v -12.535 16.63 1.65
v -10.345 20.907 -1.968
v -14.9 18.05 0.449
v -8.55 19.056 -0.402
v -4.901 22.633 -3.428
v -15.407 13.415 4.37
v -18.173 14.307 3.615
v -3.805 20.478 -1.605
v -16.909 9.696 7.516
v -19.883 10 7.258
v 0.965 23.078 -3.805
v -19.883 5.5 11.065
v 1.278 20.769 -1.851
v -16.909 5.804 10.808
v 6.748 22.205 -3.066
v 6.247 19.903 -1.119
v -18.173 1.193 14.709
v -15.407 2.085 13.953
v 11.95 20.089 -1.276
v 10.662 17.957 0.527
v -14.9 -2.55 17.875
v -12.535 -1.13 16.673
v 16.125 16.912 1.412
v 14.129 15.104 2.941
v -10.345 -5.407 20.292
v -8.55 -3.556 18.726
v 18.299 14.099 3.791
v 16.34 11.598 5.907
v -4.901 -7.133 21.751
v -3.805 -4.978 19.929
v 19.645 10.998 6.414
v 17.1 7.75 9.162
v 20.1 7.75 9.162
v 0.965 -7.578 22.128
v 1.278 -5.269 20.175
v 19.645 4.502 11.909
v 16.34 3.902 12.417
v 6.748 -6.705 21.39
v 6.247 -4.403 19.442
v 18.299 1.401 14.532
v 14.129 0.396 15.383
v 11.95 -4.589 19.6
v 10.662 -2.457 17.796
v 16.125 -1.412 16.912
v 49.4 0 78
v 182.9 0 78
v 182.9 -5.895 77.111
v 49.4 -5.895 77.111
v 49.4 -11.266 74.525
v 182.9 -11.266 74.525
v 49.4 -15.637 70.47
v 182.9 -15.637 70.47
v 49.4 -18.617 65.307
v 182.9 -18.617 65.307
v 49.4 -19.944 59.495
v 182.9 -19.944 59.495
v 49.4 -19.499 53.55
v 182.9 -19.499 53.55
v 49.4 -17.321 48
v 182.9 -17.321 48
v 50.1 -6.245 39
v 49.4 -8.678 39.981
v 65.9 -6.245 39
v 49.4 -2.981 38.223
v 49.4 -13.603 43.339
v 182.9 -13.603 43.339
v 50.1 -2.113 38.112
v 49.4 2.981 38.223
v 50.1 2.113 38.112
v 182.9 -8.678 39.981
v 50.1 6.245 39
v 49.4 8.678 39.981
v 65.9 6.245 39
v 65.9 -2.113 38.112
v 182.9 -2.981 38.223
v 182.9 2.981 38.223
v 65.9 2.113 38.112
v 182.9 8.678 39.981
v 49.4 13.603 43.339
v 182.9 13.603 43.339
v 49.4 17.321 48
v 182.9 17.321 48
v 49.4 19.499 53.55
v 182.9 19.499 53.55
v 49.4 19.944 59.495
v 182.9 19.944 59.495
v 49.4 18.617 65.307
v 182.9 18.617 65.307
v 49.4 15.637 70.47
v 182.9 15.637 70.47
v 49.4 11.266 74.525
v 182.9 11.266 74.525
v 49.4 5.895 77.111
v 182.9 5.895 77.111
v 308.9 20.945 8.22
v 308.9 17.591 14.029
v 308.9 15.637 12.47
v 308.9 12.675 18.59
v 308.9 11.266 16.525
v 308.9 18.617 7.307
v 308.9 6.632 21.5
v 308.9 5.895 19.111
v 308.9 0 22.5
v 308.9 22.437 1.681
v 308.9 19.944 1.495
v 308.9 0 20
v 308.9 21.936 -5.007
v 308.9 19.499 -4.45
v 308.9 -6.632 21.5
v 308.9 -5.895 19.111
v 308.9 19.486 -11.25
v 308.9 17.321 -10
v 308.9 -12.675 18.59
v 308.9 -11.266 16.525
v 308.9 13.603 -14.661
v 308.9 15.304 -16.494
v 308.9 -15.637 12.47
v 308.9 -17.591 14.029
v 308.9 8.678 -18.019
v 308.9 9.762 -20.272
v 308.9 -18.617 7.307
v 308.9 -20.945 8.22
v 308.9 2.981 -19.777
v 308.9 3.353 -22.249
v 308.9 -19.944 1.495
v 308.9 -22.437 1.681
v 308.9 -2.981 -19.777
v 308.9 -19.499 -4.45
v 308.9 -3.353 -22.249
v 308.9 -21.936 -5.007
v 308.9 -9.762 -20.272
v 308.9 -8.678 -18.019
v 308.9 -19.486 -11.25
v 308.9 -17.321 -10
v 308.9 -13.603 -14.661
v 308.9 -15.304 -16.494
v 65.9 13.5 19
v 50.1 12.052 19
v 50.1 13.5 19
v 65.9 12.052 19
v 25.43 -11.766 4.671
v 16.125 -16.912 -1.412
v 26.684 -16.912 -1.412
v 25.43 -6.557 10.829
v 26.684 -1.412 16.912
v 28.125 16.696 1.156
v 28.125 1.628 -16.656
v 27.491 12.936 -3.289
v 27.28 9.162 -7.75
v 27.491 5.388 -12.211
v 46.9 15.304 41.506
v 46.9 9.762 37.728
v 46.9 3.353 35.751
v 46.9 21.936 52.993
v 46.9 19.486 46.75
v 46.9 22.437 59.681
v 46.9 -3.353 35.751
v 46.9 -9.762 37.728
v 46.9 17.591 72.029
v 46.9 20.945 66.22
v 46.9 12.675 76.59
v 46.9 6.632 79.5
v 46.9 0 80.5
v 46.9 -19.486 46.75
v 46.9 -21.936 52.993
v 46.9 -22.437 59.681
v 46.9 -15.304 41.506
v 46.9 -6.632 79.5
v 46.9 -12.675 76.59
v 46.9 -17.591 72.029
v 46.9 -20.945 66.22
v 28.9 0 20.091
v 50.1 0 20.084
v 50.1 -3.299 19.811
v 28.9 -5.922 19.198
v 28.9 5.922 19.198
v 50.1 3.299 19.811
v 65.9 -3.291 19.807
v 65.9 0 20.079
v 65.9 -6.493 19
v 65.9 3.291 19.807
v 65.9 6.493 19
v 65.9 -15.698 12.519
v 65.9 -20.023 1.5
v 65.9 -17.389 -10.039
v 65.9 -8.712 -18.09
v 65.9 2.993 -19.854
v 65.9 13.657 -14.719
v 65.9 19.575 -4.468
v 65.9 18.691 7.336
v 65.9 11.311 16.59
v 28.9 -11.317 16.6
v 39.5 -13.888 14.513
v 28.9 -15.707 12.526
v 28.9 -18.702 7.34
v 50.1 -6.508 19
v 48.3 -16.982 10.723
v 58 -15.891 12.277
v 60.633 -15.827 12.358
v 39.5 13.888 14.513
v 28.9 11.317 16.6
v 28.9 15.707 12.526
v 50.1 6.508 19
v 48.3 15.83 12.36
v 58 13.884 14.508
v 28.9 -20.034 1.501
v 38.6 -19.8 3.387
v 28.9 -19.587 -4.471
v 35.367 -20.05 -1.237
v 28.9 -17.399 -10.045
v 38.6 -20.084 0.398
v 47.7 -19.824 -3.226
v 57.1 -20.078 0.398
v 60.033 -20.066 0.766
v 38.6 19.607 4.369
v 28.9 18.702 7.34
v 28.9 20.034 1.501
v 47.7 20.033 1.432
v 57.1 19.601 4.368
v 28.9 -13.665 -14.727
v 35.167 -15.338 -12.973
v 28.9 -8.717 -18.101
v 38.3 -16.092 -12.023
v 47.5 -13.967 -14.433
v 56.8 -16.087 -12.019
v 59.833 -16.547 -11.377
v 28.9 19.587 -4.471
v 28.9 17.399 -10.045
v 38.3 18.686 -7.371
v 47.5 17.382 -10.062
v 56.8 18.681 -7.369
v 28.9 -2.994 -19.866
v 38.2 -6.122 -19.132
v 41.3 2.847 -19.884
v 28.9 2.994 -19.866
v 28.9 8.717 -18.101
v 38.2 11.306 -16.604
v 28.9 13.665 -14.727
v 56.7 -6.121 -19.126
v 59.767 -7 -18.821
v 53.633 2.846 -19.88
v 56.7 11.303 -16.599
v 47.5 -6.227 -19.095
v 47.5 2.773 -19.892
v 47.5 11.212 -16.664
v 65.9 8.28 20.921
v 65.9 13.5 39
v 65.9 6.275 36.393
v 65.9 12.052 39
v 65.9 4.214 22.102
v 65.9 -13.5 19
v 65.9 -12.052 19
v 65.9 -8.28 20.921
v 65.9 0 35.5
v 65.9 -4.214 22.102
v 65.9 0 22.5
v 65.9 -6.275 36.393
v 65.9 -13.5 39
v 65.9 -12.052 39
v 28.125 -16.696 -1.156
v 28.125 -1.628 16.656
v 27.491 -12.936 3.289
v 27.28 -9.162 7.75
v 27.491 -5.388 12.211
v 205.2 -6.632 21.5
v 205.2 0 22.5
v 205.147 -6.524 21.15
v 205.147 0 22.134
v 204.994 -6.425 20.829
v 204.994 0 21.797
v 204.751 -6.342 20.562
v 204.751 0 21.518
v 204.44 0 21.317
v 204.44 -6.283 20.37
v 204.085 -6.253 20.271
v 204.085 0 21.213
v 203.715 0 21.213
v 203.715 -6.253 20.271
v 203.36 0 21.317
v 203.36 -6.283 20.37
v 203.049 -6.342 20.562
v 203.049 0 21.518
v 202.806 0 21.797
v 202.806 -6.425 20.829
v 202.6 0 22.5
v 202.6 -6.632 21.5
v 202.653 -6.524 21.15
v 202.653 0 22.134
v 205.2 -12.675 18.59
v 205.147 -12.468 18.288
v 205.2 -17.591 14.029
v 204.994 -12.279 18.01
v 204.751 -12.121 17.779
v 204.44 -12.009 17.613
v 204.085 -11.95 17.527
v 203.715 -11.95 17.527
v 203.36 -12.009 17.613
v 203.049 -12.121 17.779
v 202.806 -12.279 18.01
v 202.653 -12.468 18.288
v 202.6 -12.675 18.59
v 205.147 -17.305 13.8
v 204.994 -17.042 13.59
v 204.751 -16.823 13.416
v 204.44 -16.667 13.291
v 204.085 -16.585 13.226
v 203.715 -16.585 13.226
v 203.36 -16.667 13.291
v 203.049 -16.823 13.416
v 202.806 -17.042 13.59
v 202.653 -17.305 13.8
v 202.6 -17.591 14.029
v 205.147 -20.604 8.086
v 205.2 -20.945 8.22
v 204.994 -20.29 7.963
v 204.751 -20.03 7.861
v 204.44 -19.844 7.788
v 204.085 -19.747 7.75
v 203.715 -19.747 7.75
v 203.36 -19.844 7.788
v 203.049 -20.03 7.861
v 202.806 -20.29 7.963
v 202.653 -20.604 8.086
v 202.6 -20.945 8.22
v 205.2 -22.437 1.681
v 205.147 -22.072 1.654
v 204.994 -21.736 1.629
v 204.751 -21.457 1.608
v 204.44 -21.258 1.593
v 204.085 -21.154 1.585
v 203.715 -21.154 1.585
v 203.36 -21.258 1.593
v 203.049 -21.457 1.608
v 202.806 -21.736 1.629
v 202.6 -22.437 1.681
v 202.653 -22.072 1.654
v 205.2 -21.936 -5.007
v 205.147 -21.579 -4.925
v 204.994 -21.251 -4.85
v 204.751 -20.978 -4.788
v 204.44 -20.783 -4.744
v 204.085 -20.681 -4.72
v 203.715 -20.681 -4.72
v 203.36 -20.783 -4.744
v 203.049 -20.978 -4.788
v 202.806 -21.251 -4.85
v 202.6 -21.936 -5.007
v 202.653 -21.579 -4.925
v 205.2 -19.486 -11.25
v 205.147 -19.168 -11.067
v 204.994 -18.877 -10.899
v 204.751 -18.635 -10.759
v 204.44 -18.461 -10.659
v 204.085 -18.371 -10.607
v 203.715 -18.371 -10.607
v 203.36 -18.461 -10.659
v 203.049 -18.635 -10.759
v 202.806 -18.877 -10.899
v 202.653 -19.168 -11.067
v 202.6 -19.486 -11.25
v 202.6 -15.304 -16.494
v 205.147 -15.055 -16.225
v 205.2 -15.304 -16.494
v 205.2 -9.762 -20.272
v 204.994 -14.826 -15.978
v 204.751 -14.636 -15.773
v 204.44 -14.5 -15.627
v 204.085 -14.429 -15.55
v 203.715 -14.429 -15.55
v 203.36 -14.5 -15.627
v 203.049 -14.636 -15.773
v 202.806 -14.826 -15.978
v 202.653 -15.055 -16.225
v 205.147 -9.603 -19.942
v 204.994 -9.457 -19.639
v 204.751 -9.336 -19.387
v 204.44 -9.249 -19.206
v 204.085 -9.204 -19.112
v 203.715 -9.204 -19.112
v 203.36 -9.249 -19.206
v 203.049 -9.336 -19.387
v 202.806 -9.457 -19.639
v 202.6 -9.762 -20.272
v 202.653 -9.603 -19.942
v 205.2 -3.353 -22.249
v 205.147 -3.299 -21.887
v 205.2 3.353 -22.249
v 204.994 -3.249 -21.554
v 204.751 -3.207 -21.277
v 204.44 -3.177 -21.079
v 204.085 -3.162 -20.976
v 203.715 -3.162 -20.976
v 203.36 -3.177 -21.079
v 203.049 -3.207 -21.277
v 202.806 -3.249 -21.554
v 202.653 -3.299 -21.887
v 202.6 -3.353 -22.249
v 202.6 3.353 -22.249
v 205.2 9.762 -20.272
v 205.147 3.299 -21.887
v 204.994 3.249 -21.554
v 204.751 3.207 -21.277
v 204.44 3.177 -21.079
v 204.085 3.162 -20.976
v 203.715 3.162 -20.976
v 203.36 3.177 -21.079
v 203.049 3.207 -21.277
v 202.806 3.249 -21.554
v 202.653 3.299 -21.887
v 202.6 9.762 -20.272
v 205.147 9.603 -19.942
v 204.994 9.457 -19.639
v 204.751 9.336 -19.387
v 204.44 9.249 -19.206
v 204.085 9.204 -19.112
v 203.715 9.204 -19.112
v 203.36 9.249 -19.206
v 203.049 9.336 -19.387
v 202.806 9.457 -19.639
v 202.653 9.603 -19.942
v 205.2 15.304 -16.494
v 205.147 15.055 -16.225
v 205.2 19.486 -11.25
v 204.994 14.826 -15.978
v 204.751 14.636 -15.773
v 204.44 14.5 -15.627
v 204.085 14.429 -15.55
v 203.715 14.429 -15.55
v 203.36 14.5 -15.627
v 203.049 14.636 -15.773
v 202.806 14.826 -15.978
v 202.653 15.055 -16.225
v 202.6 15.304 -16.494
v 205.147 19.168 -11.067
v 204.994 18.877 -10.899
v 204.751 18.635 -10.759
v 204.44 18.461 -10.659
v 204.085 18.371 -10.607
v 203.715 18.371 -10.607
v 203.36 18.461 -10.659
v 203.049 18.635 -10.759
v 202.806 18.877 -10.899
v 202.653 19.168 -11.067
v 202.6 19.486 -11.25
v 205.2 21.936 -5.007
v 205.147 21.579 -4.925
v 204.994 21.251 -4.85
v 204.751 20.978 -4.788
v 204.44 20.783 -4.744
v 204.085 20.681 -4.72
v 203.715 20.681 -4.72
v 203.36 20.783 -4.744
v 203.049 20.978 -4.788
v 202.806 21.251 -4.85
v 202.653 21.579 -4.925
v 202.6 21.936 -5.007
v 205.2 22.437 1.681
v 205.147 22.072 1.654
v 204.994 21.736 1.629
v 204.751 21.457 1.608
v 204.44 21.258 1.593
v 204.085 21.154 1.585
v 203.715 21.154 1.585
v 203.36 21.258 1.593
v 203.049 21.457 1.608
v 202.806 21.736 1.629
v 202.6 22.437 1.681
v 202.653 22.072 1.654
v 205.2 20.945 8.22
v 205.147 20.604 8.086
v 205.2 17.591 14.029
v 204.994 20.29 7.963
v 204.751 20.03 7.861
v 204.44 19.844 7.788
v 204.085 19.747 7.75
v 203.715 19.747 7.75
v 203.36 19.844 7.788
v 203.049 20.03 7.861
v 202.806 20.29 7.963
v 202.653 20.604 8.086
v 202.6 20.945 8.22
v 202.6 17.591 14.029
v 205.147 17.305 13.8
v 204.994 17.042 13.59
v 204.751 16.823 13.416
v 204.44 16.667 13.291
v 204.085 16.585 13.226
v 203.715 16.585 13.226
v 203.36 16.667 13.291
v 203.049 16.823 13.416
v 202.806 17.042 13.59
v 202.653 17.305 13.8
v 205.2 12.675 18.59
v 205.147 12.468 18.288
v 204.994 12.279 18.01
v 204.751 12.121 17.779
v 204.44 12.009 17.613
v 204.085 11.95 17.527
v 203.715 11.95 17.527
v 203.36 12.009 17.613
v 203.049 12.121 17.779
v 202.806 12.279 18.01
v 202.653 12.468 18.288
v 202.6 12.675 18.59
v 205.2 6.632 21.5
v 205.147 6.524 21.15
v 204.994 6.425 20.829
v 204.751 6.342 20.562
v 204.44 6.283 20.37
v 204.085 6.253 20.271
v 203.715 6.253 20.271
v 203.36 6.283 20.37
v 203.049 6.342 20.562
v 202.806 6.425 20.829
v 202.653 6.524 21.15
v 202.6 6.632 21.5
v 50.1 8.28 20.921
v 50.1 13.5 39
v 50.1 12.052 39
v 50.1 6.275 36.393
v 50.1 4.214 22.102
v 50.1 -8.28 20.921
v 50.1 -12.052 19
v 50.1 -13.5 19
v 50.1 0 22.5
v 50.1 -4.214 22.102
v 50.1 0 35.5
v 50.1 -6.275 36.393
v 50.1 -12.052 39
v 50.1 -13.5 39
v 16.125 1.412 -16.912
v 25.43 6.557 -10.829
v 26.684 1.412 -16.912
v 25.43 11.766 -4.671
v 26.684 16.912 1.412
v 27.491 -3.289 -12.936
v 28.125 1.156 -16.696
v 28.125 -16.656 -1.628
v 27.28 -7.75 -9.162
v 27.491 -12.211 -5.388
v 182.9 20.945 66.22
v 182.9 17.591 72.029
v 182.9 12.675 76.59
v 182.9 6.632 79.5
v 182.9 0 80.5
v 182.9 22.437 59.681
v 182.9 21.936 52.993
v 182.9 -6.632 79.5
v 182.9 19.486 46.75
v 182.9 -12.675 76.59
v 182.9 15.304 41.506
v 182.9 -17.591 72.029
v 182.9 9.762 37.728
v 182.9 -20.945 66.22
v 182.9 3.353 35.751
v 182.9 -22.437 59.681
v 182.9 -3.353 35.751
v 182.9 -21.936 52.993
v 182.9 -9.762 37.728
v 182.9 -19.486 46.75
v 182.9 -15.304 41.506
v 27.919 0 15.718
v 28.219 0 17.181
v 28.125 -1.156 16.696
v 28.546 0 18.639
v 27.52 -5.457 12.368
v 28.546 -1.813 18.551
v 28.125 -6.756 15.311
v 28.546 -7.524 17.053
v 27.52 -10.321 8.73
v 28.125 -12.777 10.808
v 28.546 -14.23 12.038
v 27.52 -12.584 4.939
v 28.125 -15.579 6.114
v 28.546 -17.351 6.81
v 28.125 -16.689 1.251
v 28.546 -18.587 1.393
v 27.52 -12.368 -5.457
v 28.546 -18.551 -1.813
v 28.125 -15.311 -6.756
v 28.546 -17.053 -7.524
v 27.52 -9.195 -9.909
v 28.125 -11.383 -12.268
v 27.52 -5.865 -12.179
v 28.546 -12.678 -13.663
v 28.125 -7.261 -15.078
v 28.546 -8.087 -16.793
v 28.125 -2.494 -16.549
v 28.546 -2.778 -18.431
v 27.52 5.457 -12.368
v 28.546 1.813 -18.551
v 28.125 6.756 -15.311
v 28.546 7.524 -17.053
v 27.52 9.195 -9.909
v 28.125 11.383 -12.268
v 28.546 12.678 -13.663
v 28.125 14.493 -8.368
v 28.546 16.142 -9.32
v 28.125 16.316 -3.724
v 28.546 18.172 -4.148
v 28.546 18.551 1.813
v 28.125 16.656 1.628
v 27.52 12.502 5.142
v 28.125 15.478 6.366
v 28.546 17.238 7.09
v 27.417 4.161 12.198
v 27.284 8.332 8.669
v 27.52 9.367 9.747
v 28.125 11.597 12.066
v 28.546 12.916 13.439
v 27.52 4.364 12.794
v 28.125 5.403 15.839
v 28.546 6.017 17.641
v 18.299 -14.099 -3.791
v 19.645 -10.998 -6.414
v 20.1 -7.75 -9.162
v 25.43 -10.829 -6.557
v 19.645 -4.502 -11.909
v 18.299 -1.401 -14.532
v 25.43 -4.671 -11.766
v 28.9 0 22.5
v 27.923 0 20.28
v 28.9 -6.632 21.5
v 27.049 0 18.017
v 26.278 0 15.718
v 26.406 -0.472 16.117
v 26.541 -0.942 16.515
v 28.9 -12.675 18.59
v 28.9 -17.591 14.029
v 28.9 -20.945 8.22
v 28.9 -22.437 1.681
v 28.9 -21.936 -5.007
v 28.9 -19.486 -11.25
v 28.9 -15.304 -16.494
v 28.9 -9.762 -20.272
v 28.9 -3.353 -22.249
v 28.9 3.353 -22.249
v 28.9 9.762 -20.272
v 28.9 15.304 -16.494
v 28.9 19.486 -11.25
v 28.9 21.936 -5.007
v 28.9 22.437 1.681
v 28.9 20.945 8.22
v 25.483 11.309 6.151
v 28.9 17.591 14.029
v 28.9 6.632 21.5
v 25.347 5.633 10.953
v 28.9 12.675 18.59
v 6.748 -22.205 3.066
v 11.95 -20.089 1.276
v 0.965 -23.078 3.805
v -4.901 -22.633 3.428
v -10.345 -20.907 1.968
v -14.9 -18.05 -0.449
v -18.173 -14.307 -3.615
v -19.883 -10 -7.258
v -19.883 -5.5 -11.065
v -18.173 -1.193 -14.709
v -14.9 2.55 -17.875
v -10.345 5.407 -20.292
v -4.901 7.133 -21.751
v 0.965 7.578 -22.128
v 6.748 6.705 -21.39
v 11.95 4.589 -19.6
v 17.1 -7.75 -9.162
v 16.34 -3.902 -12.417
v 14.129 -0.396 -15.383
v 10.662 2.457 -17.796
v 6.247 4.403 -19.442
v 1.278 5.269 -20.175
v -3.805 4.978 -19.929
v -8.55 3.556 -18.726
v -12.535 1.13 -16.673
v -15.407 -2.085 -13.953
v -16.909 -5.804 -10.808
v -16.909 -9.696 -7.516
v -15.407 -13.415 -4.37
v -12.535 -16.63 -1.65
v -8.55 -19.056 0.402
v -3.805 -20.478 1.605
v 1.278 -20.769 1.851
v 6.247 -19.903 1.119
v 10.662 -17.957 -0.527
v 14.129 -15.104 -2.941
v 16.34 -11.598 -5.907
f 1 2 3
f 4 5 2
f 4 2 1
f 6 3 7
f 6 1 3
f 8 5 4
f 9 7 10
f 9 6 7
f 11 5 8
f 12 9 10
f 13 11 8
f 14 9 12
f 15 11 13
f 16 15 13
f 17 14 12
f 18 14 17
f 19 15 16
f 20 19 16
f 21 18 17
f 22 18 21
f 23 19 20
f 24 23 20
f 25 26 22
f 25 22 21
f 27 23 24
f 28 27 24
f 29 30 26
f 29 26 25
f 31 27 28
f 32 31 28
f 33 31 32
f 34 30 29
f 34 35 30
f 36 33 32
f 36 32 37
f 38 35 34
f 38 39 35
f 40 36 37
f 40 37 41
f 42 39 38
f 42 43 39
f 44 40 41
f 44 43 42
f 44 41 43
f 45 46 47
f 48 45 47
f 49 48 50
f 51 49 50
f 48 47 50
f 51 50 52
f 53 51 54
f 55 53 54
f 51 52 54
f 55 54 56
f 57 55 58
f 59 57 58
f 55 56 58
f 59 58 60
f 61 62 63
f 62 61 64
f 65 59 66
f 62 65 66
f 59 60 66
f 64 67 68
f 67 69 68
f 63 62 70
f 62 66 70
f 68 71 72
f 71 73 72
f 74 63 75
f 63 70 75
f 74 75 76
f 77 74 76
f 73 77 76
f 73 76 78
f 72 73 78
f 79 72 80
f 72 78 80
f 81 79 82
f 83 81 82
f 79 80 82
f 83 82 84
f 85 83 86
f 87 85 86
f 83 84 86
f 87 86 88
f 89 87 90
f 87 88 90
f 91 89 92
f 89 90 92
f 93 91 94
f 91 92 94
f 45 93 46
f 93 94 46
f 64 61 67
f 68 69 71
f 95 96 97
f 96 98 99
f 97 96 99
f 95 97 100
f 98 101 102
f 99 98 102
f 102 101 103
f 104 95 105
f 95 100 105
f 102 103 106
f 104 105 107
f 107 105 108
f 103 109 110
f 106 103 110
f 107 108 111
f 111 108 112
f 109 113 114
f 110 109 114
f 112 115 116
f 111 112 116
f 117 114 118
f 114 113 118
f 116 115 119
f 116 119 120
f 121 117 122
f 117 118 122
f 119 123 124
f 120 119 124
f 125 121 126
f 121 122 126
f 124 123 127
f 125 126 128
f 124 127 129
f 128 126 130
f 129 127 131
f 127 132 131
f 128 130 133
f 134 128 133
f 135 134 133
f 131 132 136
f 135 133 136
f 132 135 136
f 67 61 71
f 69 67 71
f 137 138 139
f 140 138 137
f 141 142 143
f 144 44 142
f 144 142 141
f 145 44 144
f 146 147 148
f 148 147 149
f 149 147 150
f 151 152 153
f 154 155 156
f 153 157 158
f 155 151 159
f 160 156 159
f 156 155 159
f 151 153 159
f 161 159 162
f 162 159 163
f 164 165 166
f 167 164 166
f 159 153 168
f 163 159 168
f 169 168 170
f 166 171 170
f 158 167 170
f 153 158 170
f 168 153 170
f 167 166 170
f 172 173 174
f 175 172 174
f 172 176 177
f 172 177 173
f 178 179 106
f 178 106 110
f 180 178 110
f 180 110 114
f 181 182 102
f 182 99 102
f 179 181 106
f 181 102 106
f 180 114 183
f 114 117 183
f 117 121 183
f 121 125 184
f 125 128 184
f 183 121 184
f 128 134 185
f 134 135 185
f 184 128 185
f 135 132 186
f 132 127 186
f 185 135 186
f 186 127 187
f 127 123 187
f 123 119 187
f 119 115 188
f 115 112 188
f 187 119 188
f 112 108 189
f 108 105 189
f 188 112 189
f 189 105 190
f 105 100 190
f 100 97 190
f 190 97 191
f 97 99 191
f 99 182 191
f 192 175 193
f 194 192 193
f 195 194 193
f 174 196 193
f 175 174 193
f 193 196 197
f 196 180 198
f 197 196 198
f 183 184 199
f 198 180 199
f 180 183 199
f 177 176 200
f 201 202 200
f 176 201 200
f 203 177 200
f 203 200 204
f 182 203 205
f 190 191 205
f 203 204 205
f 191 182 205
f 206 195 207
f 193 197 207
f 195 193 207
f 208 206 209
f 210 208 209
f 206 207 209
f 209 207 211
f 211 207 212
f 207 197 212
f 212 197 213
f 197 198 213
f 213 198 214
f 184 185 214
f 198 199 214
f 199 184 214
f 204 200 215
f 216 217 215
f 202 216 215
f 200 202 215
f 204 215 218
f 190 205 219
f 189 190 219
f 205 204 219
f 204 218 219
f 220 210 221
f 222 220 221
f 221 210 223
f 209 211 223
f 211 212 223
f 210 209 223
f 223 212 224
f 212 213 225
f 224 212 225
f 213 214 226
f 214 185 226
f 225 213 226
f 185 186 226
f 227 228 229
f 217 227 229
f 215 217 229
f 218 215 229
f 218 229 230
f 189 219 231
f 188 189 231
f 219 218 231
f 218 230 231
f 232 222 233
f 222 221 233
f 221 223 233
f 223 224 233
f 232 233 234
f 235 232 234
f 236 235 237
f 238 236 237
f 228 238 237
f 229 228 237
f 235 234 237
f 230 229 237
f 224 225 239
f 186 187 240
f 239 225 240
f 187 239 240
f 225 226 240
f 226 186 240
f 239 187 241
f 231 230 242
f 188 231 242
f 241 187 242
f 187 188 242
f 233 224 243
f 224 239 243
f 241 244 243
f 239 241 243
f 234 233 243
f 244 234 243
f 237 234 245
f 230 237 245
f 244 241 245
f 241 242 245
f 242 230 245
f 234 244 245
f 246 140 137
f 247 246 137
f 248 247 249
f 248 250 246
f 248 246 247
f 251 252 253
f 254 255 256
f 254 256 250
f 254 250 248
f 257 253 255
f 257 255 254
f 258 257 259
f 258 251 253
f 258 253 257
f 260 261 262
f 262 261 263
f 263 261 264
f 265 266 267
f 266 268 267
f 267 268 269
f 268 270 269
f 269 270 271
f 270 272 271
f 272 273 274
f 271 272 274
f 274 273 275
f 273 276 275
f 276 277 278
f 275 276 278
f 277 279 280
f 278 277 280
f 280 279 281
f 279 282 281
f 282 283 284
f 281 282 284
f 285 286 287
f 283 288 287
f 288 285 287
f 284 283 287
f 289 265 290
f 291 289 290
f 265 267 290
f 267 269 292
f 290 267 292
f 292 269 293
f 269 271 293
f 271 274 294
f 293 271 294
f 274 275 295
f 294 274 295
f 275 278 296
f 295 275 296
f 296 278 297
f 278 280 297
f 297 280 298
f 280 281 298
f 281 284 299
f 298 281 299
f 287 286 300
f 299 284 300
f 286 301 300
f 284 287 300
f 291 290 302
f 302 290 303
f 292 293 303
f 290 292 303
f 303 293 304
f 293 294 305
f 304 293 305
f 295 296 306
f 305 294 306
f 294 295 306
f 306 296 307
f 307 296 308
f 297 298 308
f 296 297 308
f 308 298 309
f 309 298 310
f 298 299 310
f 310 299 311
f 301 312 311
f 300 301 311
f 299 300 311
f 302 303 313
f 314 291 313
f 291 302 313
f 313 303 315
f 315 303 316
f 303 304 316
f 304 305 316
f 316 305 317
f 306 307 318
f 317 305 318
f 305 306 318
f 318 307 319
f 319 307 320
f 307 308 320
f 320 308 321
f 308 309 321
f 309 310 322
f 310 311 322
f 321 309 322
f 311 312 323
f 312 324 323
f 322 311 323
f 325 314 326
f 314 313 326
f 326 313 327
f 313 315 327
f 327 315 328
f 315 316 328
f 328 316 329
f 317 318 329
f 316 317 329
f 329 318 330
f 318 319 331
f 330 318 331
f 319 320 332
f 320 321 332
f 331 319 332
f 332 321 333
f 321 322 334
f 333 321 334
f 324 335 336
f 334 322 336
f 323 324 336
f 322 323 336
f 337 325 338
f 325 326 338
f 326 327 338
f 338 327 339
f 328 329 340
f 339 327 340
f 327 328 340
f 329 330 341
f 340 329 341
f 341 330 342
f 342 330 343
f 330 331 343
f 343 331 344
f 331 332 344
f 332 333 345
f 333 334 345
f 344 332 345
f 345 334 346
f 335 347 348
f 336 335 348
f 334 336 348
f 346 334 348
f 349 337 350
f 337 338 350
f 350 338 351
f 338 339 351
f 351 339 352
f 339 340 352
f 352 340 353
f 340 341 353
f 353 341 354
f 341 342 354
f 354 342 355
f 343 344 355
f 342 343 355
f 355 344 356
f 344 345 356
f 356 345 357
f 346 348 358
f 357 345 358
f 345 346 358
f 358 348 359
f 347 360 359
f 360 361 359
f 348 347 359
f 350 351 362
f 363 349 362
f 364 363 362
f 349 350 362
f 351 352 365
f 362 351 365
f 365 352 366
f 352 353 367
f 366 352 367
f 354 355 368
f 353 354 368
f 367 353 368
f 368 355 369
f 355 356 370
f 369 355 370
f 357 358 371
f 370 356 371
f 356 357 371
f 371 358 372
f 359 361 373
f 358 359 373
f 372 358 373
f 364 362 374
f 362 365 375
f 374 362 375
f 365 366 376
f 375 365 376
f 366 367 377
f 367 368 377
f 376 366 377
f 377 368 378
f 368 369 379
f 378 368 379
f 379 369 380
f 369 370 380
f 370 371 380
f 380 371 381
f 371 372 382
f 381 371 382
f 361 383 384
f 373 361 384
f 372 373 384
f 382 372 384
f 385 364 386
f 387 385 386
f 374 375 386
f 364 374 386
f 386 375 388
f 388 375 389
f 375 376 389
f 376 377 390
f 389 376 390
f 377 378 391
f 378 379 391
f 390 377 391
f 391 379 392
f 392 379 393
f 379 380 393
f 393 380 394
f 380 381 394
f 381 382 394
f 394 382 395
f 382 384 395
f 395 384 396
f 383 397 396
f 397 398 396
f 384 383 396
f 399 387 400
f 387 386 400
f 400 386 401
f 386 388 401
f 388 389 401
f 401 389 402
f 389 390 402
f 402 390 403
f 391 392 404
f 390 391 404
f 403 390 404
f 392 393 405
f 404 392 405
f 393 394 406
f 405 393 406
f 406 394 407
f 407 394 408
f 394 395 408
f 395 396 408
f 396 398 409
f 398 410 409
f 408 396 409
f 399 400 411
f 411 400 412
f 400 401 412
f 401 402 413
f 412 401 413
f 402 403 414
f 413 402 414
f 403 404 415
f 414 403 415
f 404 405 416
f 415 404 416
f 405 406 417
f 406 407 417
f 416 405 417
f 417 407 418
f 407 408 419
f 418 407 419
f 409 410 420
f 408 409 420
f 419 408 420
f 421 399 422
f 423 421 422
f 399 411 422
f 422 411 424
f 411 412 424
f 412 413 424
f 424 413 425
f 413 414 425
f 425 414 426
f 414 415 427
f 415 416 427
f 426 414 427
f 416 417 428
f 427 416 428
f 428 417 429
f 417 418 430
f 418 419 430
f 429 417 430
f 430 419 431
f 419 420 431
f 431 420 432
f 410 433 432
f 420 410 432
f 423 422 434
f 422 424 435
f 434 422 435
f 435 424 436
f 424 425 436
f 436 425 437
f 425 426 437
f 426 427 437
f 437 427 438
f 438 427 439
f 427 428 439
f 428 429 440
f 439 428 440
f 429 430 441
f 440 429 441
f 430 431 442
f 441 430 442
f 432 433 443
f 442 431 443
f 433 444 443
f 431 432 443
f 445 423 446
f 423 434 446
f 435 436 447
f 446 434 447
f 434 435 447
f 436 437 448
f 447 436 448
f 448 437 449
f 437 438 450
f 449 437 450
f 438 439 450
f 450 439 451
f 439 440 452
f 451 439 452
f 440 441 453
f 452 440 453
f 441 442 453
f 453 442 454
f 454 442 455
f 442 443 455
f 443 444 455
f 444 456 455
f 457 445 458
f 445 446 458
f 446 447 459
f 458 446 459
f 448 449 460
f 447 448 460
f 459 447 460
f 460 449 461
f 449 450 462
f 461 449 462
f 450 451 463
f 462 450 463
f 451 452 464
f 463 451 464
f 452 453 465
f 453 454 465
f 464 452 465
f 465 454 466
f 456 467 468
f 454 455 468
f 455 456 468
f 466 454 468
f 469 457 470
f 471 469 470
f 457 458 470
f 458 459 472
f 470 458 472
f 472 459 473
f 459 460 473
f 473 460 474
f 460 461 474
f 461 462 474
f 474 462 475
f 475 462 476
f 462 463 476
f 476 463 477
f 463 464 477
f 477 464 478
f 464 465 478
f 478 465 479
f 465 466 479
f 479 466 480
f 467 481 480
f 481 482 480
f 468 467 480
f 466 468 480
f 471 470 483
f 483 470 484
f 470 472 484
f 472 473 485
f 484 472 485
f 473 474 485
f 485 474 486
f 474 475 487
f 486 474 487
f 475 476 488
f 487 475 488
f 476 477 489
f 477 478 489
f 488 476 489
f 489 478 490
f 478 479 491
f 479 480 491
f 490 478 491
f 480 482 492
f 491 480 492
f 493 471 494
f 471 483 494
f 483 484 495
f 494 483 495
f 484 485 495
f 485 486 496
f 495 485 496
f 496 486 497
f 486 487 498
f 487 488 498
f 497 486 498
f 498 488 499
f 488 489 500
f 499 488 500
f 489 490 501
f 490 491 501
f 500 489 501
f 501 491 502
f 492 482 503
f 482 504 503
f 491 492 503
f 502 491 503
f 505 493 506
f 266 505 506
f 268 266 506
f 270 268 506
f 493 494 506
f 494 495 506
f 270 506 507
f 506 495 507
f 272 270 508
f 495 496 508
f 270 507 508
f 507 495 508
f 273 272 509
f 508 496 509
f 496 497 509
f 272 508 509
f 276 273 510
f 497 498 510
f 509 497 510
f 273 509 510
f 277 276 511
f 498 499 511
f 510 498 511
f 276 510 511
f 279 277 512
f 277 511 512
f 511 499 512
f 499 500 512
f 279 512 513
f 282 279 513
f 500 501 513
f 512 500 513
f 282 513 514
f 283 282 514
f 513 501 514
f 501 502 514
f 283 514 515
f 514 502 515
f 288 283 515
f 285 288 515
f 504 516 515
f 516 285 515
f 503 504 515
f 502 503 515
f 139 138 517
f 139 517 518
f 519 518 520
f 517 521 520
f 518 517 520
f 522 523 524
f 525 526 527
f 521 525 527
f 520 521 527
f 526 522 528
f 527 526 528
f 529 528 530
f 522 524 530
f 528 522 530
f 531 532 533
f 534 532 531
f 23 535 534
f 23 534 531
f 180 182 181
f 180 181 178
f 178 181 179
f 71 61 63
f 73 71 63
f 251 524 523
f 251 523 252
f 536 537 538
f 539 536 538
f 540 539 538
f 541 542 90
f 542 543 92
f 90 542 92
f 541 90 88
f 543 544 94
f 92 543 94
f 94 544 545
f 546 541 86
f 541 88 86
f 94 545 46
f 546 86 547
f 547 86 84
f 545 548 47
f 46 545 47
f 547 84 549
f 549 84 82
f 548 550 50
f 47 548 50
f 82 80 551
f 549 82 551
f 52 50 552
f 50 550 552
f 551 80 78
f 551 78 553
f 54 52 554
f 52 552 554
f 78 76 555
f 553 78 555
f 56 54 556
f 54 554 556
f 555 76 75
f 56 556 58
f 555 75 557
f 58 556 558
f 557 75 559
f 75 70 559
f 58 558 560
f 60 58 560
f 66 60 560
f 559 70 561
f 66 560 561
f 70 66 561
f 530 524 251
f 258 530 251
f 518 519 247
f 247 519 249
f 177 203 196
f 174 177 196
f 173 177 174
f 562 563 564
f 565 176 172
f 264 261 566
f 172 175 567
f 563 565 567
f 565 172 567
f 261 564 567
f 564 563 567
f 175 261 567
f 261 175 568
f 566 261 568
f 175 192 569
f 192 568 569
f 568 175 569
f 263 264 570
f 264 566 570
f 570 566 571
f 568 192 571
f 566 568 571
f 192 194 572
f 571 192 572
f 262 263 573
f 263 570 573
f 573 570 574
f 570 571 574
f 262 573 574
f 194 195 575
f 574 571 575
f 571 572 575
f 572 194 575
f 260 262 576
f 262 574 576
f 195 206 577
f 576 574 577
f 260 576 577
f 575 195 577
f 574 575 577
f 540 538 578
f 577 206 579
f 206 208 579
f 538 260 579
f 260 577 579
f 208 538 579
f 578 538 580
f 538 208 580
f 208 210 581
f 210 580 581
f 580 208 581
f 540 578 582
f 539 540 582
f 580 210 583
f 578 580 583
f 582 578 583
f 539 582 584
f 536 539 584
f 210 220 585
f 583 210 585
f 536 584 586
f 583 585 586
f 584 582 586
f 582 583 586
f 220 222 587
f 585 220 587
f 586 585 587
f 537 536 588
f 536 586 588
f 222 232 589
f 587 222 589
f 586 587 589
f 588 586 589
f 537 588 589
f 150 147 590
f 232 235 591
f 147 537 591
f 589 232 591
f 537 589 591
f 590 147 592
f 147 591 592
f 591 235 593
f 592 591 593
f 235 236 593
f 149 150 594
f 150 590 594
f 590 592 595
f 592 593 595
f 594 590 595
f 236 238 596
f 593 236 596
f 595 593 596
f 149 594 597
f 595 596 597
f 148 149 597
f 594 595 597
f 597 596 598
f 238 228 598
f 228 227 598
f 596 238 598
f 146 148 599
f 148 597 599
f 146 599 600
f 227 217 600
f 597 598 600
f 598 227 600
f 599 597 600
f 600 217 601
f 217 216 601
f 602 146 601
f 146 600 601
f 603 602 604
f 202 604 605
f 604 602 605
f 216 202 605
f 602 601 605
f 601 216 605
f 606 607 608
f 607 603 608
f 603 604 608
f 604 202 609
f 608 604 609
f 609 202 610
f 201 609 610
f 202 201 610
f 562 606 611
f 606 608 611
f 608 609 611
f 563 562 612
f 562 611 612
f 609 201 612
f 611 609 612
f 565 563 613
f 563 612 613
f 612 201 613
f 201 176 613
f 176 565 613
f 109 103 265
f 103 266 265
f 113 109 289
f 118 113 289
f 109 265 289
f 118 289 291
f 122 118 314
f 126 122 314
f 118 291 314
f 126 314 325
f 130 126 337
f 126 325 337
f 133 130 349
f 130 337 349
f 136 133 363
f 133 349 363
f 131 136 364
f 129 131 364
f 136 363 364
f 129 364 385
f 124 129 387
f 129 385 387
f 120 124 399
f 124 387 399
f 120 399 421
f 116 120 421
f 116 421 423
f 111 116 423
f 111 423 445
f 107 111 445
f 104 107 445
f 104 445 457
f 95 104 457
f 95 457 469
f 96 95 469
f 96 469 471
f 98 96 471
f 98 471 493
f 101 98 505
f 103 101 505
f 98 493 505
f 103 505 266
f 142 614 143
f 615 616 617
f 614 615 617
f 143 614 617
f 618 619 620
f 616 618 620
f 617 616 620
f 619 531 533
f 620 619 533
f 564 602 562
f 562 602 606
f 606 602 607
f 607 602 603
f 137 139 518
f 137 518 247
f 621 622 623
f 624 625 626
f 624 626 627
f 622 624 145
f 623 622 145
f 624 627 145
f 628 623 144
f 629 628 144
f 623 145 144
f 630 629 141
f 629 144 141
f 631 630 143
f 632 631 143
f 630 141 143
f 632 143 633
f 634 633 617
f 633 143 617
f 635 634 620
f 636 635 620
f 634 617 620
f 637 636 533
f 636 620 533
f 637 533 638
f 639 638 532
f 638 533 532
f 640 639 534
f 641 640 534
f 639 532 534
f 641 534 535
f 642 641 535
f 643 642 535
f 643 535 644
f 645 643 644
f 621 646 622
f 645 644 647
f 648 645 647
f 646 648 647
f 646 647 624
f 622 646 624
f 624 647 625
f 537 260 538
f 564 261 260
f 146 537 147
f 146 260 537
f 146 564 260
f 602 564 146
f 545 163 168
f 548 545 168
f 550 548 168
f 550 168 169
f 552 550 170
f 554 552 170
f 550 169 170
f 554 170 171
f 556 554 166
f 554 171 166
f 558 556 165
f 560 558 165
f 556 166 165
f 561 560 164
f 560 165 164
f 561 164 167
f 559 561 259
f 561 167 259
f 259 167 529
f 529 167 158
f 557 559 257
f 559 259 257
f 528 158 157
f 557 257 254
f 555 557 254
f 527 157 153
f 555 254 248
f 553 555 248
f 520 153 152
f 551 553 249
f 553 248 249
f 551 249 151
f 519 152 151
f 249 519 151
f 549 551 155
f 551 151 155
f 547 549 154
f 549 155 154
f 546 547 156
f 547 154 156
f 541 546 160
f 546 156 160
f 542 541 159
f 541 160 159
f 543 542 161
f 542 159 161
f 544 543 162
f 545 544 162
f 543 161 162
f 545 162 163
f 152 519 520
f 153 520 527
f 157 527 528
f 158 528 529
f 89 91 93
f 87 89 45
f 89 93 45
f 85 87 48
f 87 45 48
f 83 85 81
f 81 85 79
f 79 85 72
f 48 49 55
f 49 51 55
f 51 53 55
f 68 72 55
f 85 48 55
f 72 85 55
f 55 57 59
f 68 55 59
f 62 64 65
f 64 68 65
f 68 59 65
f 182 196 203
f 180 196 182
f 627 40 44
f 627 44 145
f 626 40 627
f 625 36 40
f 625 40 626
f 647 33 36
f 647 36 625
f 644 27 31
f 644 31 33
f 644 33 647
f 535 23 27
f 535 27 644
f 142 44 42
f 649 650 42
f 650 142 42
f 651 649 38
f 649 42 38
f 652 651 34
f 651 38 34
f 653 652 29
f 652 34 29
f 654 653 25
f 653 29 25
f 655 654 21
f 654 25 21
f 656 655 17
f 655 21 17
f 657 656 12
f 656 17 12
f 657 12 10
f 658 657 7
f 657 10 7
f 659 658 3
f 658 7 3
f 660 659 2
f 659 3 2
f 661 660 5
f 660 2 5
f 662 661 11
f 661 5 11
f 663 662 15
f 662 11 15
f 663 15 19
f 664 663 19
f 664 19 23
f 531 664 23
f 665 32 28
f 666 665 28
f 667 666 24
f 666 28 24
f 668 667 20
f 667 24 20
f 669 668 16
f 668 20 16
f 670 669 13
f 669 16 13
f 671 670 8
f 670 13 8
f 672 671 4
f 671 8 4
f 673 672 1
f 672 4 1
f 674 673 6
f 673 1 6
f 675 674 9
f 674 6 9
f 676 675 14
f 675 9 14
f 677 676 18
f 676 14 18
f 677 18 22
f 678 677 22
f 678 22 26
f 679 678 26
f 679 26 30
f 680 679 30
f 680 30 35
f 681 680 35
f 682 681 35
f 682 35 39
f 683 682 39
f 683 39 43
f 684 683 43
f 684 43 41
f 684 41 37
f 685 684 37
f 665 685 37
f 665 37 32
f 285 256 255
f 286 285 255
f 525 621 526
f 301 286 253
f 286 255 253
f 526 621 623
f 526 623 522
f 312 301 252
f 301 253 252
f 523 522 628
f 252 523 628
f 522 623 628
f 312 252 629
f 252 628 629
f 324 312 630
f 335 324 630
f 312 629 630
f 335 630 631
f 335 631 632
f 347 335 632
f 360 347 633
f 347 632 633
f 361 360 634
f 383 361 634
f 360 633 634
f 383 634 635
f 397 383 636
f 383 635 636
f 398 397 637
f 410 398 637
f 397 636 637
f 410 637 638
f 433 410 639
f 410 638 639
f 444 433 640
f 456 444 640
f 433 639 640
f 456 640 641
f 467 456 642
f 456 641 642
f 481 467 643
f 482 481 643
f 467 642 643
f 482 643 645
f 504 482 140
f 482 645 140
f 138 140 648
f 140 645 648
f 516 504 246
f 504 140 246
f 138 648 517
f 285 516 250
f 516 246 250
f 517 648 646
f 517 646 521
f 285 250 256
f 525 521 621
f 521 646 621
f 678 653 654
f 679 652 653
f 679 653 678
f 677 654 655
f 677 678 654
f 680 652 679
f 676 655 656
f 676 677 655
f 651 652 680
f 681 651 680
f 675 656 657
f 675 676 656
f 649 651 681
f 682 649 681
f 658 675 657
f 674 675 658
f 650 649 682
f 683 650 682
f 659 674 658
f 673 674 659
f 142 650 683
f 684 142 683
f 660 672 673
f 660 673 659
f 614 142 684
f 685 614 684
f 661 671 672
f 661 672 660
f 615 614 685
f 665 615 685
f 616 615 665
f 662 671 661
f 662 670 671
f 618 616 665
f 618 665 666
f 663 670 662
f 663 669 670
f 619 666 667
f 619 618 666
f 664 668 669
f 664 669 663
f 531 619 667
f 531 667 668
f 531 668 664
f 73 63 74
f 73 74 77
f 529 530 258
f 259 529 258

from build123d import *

# Parameters (mm, degrees)
F4_W      = 15.8
F4_H      = 20
F5_DEPTH  = 13.5
F7_DEPTH  = 20.1
F8_R      = 17.1
F9_DEPTH  = 25
F11_DEPTH = 24


with BuildPart() as f1:
    # F0 (on Front) → F1 (revolve)
    with BuildSketch(Plane.XZ):
        with BuildLine():
            Line((28.9, 20.0906451762), (308.9, 20))
            Line((308.9, 20), (308.9, 22.5))
            Line((308.9, 22.5), (205.2, 22.5))
            ThreePointArc((205.2, 22.5), (203.9, 21.2), (202.6, 22.5))
            Line((202.6, 22.5), (28.9, 22.5))
            Line((28.9, 22.5), (28.9, 20.0906451762))
        make_face()
        with BuildLine():
            ThreePointArc((26.400000374, 0), (27.0246011146, 10.1231447503), (28.9, 20.0906451762))
            Line((28.9, 20.0906451762), (28.9, 22.5))
            ThreePointArc((28.9, 22.5), (25.1650624277, 11.5244305716), (23.9, 0))
            Line((23.9, 0), (26.400000374, 0))
        make_face()
    revolve(axis=Axis((168.9, 0, 0), (1, 0, 0)))



with BuildPart() as f3:
    # F2 (on Front) → F3 (revolve)
    with BuildSketch(Plane.XZ):
        Polygon((49.4, 78), (182.9, 78), (182.9, 80.5), (46.9, 80.5), (46.9, 58), (49.4, 58), align=None)
    revolve(axis=Axis((114.9, 0, 58), (1, 0, 0)))


with BuildPart() as f1_1:
    add(f1.part)

    add(f3.part)  # F5 merges F3
    # F4 (on Front) → F5 (join, symmetric)
    with BuildSketch(Plane.XZ):
        with Locations((58, 29)):
            Rectangle(F4_W, F4_H)
    extrude(amount=F5_DEPTH, both=True)



with BuildPart() as f7:
    # F6 (on Right) → F7 (new body, symmetric)
    with BuildSketch(Plane.YZ):
        Polygon((-7.595916344, 22.1429911009), (-23.095916344, 3.8195088991), (7.595916344, -22.1429911009), (23.095916344, -3.8195088991), align=None)
    extrude(amount=F7_DEPTH, both=True)

    # F8 (on face) → F9 (cut)
    with BuildSketch(Plane(origin=(0, 7.75, 9.1617411009), x_dir=(1, 0, 0), z_dir=(0, 0.6458333333, 0.7634784251))):
        with BuildLine():
            ThreePointArc((-1.76e-08, 20.1), (14.2128462956, 14.2128463081), (20.1, 0))
            Line((20.1, 0), (20.1, 20.1))
            Line((20.1, 20.1), (-1.76e-08, 20.1))
        make_face()
        with BuildLine():
            ThreePointArc((-20.1, -7.91e-08), (-14.212846336, 14.2128462677), (-1.76e-08, 20.1))
            Line((-1.76e-08, 20.1), (-20.1, 20.1))
            Line((-20.1, 20.1), (-20.1, -7.91e-08))
        make_face()
        with BuildLine():
            Line((-20.1, -20.1), (4.8e-08, -20.1))
            ThreePointArc((4.8e-08, -20.1), (-14.2128462569, -14.2128463468), (-20.1, -7.91e-08))
            Line((-20.1, -7.91e-08), (-20.1, -20.1))
        make_face()
        with BuildLine():
            Line((20.1, -20.1), (20.1, 0))
            ThreePointArc((20.1, 0), (14.2128463188, -14.2128462849), (4.8e-08, -20.1))
            Line((4.8e-08, -20.1), (20.1, -20.1))
        make_face()
        Circle(F8_R)
    extrude(amount=-F9_DEPTH, mode=Mode.SUBTRACT)


with BuildPart() as f1_2:
    add(f1_1.part)

    add(f7.part)  # F11 merges F7
    # F10 (on face) → F11 (join)
    with BuildSketch(Plane(origin=(0, 7.75, 9.1617411009), x_dir=(1, 0, 0), z_dir=(0, 0.6458333333, 0.7634784251))):
        with BuildLine():
            Line((28.1248255805, 12), (16.1248255805, 12))
            ThreePointArc((16.1248255805, 12), (19.0803432119, 6.320641021), (20.1, 0))
            ThreePointArc((20.1, 0), (19.0803432119, -6.320641021), (16.1248255805, -12))
            Line((16.1248255805, -12), (28.1248255805, -12))
            Line((28.1248255805, -12), (28.1248255805, 12))
        make_face()
    extrude(amount=-F11_DEPTH)


solid = f1_2.part
